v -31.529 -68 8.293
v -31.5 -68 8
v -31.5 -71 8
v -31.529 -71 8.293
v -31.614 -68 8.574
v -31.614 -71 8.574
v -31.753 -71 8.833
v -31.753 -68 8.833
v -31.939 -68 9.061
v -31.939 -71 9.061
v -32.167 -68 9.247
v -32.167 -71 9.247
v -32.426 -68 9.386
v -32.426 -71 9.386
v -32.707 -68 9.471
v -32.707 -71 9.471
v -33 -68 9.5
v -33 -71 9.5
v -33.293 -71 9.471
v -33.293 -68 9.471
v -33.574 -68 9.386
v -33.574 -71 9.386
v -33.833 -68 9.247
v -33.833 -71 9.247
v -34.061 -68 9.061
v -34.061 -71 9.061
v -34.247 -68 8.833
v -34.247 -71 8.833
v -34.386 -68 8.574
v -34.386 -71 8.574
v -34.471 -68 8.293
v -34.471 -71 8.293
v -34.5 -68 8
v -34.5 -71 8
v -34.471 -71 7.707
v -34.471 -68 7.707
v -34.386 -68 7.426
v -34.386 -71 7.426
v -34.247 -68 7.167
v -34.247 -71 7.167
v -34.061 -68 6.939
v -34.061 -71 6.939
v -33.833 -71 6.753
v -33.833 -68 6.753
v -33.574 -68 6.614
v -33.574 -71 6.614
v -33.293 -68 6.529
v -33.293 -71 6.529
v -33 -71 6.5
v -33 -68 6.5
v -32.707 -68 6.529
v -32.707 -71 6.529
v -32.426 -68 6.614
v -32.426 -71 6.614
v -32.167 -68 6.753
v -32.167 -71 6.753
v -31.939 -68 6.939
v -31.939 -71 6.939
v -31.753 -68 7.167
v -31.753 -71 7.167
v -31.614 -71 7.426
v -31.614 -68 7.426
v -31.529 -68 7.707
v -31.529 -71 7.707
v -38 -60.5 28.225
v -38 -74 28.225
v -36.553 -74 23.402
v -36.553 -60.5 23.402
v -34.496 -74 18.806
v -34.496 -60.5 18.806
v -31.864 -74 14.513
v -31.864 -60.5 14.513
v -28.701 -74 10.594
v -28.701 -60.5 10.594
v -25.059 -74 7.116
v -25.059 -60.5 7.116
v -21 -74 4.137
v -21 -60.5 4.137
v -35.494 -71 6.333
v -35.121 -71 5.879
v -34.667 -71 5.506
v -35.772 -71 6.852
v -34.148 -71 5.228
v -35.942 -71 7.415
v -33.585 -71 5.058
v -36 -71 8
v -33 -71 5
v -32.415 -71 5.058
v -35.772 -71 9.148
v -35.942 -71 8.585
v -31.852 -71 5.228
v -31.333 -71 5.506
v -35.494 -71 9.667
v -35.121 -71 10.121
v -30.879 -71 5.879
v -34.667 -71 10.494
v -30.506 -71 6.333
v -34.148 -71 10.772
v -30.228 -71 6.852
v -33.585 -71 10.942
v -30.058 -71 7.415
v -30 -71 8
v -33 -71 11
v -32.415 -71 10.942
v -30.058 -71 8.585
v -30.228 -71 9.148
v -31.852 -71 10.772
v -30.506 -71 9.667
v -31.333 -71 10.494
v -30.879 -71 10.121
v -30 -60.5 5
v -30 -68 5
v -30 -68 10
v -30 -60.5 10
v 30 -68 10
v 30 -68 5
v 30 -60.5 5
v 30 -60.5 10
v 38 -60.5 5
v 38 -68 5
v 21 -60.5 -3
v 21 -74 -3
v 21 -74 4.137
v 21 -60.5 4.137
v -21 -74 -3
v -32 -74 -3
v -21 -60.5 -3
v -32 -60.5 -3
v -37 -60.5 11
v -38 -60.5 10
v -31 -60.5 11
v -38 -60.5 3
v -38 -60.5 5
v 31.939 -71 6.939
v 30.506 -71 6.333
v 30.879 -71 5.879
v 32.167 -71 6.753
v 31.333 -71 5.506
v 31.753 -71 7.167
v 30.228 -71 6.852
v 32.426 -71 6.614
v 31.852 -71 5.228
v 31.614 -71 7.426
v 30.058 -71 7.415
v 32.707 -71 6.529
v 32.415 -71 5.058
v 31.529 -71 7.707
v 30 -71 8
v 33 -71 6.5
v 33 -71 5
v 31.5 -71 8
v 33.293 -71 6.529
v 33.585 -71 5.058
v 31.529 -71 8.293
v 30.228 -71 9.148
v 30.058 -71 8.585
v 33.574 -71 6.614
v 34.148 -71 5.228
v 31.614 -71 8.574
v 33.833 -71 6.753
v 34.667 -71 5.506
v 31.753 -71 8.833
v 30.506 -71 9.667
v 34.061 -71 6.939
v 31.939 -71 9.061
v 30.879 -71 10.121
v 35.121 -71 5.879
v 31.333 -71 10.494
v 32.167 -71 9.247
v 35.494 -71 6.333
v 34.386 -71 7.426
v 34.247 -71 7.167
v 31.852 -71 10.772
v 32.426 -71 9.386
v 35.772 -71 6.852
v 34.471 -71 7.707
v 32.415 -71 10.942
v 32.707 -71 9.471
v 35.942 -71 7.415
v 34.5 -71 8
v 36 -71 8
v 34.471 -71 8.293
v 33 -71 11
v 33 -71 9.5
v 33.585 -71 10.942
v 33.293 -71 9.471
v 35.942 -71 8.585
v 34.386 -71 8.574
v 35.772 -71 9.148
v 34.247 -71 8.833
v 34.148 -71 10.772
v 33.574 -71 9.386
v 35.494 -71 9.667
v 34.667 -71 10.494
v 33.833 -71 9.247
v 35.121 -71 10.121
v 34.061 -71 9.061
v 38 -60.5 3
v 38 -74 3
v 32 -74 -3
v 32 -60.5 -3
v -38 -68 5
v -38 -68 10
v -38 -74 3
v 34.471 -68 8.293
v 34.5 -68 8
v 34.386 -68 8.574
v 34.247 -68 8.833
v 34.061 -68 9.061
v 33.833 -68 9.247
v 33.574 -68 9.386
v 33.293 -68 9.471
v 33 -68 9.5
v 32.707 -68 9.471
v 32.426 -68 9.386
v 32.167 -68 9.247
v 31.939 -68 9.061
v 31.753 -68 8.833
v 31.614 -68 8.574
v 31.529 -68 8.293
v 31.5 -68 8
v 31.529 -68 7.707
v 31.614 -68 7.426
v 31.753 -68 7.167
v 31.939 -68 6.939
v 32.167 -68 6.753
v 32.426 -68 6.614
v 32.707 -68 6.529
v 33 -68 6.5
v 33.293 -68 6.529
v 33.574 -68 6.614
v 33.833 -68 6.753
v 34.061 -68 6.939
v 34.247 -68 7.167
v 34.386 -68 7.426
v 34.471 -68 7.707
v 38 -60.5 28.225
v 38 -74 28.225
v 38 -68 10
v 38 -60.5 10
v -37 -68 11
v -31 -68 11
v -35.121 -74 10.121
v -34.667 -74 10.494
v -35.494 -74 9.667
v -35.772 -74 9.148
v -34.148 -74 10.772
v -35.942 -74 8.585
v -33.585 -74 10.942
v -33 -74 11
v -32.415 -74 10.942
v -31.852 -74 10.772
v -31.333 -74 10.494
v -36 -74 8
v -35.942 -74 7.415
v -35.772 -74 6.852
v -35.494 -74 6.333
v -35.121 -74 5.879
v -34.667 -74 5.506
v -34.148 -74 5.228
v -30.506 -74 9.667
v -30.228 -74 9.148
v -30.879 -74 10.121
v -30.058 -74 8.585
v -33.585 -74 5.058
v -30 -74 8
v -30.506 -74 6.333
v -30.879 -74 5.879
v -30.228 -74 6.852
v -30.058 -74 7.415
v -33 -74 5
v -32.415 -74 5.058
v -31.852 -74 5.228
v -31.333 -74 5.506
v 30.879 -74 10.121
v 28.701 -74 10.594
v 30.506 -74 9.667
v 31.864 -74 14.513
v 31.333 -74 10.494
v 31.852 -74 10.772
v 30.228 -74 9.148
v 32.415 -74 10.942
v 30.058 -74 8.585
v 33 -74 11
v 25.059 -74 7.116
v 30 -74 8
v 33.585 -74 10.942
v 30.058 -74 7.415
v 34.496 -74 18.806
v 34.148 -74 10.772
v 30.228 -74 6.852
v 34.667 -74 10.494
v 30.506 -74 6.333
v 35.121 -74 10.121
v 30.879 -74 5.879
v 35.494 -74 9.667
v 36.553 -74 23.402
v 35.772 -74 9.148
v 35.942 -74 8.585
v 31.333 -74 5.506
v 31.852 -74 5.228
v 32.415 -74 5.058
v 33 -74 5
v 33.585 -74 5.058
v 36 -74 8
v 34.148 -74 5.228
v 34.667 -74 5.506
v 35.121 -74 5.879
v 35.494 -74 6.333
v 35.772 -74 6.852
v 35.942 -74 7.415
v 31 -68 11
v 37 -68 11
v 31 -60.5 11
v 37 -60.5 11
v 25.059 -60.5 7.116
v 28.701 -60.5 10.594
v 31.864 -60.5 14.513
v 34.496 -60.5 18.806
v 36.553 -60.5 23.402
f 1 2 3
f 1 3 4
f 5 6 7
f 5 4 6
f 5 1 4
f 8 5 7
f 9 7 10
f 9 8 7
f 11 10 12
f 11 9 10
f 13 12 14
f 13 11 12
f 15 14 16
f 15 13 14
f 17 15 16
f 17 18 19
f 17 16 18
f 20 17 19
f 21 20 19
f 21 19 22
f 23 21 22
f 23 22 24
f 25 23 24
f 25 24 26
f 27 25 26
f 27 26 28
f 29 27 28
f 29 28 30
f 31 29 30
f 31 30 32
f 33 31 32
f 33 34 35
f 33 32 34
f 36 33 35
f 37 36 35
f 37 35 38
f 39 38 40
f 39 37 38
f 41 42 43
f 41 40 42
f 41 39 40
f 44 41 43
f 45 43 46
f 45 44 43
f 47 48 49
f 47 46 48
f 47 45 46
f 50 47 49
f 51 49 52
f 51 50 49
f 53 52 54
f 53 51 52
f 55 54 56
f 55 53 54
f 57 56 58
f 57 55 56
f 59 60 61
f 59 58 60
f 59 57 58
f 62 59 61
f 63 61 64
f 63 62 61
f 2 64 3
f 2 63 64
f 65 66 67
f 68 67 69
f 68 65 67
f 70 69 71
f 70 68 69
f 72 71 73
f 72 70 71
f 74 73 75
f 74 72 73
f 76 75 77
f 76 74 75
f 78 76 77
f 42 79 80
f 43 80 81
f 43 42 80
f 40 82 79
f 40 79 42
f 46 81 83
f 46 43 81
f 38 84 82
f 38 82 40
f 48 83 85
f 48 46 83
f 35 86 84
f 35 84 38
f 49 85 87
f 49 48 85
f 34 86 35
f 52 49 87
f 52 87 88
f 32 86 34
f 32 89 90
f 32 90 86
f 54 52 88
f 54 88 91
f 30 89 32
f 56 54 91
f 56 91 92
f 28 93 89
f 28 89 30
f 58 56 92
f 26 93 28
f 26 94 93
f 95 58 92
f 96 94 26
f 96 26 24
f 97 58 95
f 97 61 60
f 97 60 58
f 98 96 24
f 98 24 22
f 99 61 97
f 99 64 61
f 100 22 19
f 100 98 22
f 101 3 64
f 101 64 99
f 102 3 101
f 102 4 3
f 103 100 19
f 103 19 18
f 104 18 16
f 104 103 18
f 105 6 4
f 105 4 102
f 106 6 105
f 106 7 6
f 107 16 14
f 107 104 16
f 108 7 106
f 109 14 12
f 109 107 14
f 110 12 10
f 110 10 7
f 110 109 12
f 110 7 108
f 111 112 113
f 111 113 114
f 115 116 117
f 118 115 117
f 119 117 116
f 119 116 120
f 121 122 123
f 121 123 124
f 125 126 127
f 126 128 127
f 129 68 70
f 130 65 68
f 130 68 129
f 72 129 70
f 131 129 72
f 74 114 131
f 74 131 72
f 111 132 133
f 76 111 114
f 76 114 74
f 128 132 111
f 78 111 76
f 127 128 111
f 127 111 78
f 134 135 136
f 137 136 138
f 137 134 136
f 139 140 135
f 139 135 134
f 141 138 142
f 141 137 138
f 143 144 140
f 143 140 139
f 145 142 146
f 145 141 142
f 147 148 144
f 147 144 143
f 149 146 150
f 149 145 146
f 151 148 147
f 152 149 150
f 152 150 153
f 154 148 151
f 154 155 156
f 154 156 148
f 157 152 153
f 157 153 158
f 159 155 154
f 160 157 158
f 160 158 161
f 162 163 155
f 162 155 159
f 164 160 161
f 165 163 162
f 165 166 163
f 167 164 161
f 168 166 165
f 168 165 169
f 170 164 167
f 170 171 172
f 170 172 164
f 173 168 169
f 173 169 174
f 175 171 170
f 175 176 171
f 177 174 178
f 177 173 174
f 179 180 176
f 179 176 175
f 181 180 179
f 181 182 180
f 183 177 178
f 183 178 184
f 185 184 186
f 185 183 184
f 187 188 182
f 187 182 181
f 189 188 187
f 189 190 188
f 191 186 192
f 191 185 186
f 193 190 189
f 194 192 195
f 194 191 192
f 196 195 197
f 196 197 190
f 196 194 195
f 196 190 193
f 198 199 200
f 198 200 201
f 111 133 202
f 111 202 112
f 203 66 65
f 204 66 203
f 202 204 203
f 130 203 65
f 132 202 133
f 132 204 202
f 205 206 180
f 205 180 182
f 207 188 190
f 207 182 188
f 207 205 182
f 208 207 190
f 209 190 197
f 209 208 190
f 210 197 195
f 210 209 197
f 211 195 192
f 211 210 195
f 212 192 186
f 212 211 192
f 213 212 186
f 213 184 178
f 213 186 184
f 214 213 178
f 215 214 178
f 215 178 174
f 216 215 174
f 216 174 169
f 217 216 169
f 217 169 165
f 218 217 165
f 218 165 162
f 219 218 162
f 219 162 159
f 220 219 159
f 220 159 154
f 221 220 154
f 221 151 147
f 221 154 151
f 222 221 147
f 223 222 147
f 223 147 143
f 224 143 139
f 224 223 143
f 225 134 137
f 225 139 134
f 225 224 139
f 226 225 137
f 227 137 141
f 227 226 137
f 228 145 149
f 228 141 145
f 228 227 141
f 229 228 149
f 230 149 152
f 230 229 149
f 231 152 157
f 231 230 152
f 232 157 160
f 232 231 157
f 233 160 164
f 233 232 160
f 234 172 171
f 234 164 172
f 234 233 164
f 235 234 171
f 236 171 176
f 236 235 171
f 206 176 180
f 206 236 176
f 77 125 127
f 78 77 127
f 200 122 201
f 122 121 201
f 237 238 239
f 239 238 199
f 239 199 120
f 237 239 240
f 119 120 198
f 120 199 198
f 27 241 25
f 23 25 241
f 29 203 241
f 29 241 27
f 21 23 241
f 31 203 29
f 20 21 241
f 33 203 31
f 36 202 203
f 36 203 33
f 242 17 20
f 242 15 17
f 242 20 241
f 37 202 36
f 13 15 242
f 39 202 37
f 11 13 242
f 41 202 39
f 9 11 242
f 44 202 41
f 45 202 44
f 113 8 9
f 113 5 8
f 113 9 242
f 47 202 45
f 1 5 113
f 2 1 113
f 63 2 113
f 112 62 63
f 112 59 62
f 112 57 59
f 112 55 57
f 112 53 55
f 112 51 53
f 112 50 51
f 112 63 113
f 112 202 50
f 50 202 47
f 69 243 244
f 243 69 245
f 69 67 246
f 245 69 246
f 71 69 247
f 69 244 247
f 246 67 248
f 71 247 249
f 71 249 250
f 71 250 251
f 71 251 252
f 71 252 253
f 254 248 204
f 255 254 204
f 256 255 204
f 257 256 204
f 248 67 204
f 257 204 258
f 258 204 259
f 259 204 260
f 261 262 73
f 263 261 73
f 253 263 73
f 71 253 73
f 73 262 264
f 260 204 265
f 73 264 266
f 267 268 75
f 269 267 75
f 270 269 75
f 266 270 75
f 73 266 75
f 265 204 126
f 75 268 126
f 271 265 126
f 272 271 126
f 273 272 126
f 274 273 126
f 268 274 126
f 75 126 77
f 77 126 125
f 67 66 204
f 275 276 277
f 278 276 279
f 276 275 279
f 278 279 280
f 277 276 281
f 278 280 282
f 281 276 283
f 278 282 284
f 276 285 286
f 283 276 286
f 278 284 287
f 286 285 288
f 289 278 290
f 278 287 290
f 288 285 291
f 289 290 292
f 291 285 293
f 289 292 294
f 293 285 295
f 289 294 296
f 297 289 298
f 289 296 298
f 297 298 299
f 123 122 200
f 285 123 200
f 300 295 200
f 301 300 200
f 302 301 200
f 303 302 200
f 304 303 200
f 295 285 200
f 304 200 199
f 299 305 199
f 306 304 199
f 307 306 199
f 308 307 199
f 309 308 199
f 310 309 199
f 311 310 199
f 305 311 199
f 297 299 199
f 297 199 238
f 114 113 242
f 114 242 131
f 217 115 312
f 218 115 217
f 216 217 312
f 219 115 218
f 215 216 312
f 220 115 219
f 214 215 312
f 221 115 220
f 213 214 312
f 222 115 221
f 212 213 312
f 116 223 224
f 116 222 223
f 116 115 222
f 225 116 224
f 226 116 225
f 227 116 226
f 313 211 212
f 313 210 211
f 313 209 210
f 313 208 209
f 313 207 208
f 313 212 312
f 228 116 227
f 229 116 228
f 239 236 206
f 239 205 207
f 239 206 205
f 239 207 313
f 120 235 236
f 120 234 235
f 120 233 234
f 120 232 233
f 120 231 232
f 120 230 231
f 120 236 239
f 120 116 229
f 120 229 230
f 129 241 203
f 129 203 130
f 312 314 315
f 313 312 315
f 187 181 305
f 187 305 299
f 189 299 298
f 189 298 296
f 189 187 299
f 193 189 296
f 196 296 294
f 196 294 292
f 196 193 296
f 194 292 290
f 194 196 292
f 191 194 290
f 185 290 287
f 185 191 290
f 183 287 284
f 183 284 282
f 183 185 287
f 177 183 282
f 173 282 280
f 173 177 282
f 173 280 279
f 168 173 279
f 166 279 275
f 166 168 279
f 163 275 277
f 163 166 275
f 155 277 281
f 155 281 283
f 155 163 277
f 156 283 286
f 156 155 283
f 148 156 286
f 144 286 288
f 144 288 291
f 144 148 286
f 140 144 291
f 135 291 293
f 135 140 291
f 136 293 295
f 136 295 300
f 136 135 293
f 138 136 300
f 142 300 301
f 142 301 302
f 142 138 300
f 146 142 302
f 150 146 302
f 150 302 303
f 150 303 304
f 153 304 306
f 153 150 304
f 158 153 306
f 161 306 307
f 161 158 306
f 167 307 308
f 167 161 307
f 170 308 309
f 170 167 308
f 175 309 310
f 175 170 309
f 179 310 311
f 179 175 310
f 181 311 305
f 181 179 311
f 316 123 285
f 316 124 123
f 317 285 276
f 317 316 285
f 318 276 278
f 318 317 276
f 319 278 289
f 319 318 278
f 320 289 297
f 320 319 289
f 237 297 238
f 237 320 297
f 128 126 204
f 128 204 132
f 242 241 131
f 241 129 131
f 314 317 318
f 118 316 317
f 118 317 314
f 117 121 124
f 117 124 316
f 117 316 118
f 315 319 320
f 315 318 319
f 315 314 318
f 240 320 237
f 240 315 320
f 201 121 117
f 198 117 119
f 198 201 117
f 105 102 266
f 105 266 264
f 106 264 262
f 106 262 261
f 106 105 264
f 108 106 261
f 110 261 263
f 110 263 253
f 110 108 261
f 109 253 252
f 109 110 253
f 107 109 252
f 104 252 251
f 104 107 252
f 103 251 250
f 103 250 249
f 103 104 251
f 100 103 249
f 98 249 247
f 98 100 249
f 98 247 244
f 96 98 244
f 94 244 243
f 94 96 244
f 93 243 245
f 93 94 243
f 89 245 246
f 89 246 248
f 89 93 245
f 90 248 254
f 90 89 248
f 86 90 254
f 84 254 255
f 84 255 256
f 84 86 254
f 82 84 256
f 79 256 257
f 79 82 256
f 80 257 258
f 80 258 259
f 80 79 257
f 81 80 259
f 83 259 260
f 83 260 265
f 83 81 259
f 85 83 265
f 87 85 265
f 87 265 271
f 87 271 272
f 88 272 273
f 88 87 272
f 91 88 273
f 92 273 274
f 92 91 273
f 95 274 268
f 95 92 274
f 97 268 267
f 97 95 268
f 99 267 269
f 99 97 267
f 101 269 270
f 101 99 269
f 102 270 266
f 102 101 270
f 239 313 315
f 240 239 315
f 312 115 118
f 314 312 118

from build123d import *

# Parameters (mm, degrees)
CYLINDER2680_R     = 1.5
CYLINDER2680_DEPTH = 60
CYLINDER2679_R     = 1.5
CYLINDER2679_DEPTH = 60
CYLINDER2678_R     = 3
CYLINDER2678_DEPTH = 3
CYLINDER2677_R     = 3
CYLINDER2677_DEPTH = 3
CYLINDER_R         = 39
CYLINDER_DEPTH     = 20
CYLINDER2675_R     = 38
CYLINDER2675_DEPTH = 16
BOX914_W           = 8
BOX914_H           = 69
BOX914_DEPTH       = 6
CHAMFER143_SIZE    = 1
CHAMFER141_SIZE    = 1
CYLINDER2676_R     = 38
CYLINDER2676_DEPTH = 16
BOX915_W           = 8
BOX915_H           = 69
BOX915_DEPTH       = 6
CHAMFER142_SIZE    = 1
CHAMFER140_SIZE    = 1
BOX913_W           = 17
BOX913_H           = 13.5
BOX913_DEPTH       = 40
BOX912_W           = 17
BOX912_H           = 13.5
BOX912_DEPTH       = 40
CHAMFER_SIZE       = 6


with BuildPart() as v_lec2650:
    # Cylinder2680 → Cylinder2680 (new body)
    with BuildSketch(Plane(origin=(33, -10, 8), x_dir=(1, 0, 0), z_dir=(0, -1, 0))):
        Circle(CYLINDER2680_R)
    extrude(amount=CYLINDER2680_DEPTH)


with BuildPart() as compound1190:
    # Cylinder2679 → Cylinder2679 (new body)
    with BuildSketch(Plane(origin=(-33, -10, 8), x_dir=(1, 0, 0), z_dir=(0, -1, 0))):
        Circle(CYLINDER2679_R)
    extrude(amount=CYLINDER2679_DEPTH)

    # Compound1190: union Válec2650
    add(v_lec2650.part)


with BuildPart() as compound1190_1:
    # Compound1190 placement: moved
    add(compound1190.part.moved(Location((0, -4, 0))))


with BuildPart() as v_lec2648:
    # Cylinder2678 → Cylinder2678 (new body)
    with BuildSketch(Plane(origin=(33, -61, 8), x_dir=(1, 0, 0), z_dir=(0, -1, 0))):
        Circle(CYLINDER2678_R)
    extrude(amount=CYLINDER2678_DEPTH)


with BuildPart() as compound1189:
    # Cylinder2677 → Cylinder2677 (new body)
    with BuildSketch(Plane(origin=(-33, -61, 8), x_dir=(1, 0, 0), z_dir=(0, -1, 0))):
        Circle(CYLINDER2677_R)
    extrude(amount=CYLINDER2677_DEPTH)

    # Compound1189: union Válec2648
    add(v_lec2648.part)


with BuildPart() as compound1189_1:
    # Compound1189 placement: moved
    add(compound1189.part.moved(Location((0, -10, 0))))


with BuildPart() as v_lec:
    # Cylinder → Cylinder (new body)
    with BuildSketch(Plane(origin=(0, -54, 37), x_dir=(1, 0, 0), z_dir=(0, -1, 0))):
        Circle(CYLINDER_R)
    extrude(amount=CYLINDER_DEPTH)


with BuildPart() as v_lec2645:
    # Cylinder2675 → Cylinder2675 (new body)
    with BuildSketch(Plane.XY):
        Circle(CYLINDER2675_R)
    extrude(amount=CYLINDER2675_DEPTH)


with BuildPart() as cut997:
    # Box914 → Box914 (new body)
    with BuildSketch(Plane(origin=(-38, -68, 5), x_dir=(1, 0, 0), z_dir=(0, 0, 1))):
        with Locations((4, 34.5)):
            Rectangle(BOX914_W, BOX914_H)
    extrude(amount=BOX914_DEPTH)

    # Chamfer143
    chamfer143_edges = [cut997.edges().sort_by_distance(p)[0] for p in [
        (-38, -33.5, 11),
    ]]
    chamfer(chamfer143_edges, length=CHAMFER143_SIZE)

    # Chamfer141
    chamfer141_edges = [cut997.edges().sort_by_distance(p)[0] for p in [
        (-30, -33.5, 11),
    ]]
    chamfer(chamfer141_edges, length=CHAMFER141_SIZE)

    # Cut997: cut Válec2645
    add(v_lec2645.part, mode=Mode.SUBTRACT)


with BuildPart() as v_lec2646:
    # Cylinder2676 → Cylinder2676 (new body)
    with BuildSketch(Plane.XY):
        Circle(CYLINDER2676_R)
    extrude(amount=CYLINDER2676_DEPTH)


with BuildPart() as compound1188:
    # Box915 → Box915 (new body)
    with BuildSketch(Plane(origin=(30, -68, 5), x_dir=(1, 0, 0), z_dir=(0, 0, 1))):
        with Locations((4, 34.5)):
            Rectangle(BOX915_W, BOX915_H)
    extrude(amount=BOX915_DEPTH)

    # Chamfer142
    chamfer142_edges = [compound1188.edges().sort_by_distance(p)[0] for p in [
        (38, -33.5, 11),
    ]]
    chamfer(chamfer142_edges, length=CHAMFER142_SIZE)

    # Chamfer140
    chamfer140_edges = [compound1188.edges().sort_by_distance(p)[0] for p in [
        (30, -33.5, 11),
    ]]
    chamfer(chamfer140_edges, length=CHAMFER140_SIZE)

    # Cut998: cut Válec2646
    add(v_lec2646.part, mode=Mode.SUBTRACT)

    # Compound1188: union Cut997
    add(cut997.part)


with BuildPart() as krychle912:
    # Box913 → Box913 (new body)
    with BuildSketch(Plane(origin=(-38, -68, -3), x_dir=(1, 0, 0), z_dir=(0, 0, 1))):
        with Locations((8.5, 6.75)):
            Rectangle(BOX913_W, BOX913_H)
    extrude(amount=BOX913_DEPTH)


with BuildPart() as cut1001:
    # Box912 → Box912 (new body)
    with BuildSketch(Plane(origin=(21, -68, -3), x_dir=(1, 0, 0), z_dir=(0, 0, 1))):
        with Locations((8.5, 6.75)):
            Rectangle(BOX912_W, BOX912_H)
    extrude(amount=BOX912_DEPTH)

    # Compound1184: union Krychle912
    add(krychle912.part)


with BuildPart() as cut1001_1:
    # Compound1184 placement: moved
    add(cut1001.part.moved(Location((0, -6, 0))))

    # Cut: cut Compound1188
    add(compound1188.part, mode=Mode.SUBTRACT)

    # Cut999: cut Válec
    add(v_lec.part, mode=Mode.SUBTRACT)

    # Chamfer
    chamfer_edges = [cut1001_1.edges().sort_by_distance(p)[0] for p in [
        (38, -67.25, -3),
        (-38, -67.25, -3),
    ]]
    chamfer(chamfer_edges, length=CHAMFER_SIZE)

    # Cut1000: cut Compound1189
    add(compound1189_1.part, mode=Mode.SUBTRACT)

    # Cut1001: cut Compound1190
    add(compound1190_1.part, mode=Mode.SUBTRACT)


solid = cut1001_1.part
